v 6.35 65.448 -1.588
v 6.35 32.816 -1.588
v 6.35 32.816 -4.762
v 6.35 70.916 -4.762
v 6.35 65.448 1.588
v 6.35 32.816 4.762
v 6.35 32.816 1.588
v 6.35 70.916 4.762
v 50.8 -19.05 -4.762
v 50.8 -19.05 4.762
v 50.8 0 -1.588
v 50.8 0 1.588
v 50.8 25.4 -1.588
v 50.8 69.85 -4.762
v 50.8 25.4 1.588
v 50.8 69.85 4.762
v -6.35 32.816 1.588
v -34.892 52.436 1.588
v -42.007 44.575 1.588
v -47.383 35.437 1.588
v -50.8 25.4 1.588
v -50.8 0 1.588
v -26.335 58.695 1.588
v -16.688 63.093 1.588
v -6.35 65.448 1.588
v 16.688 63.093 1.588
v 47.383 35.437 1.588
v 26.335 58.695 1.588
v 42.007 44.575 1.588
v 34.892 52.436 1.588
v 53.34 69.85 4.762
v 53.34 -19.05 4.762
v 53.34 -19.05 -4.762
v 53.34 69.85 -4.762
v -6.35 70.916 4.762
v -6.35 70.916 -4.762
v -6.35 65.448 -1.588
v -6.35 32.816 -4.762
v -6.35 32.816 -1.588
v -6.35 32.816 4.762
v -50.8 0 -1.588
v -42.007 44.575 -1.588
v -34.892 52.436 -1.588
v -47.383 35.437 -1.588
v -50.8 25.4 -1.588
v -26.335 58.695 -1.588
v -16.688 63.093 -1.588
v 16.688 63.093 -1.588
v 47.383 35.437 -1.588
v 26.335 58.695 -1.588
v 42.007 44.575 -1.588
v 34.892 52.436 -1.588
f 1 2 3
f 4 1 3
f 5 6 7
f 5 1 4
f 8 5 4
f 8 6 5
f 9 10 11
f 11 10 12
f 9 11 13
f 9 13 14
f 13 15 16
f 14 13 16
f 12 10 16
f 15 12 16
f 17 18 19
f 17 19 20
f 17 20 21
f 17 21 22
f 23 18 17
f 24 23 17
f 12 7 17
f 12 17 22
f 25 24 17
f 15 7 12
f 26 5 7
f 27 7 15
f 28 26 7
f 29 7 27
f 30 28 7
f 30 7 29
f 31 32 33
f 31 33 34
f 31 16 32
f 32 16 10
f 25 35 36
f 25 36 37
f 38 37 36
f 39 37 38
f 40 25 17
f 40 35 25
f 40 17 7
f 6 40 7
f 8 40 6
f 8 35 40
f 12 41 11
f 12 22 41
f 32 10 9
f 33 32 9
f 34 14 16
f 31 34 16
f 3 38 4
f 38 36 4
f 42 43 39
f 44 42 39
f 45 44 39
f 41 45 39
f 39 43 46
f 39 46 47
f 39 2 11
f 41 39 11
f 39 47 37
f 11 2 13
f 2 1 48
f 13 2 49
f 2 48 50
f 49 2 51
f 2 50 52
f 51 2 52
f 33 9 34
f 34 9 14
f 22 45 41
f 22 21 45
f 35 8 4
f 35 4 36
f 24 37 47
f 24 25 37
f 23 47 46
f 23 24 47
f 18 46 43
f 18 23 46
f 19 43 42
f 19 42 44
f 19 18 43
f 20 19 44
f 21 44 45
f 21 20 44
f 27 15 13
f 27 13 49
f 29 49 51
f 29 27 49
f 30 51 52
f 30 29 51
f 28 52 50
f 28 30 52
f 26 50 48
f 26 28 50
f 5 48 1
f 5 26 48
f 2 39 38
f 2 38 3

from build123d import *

# Parameters (mm, degrees)
F1_DEPTH = 1.5875
F2_DEPTH = 1.5875
F3_DEPTH = 4.7625
F4_DEPTH = 4.7625
F5_W     = 19.05
F5_H     = 3.175
F5_W_2   = 25.4
F5_W_3   = 44.45
F6_DEPTH = 2.54


with BuildPart() as f1:
    # F0 (on Top) → F1 (new body)
    with BuildSketch(Plane.XY):
        with BuildLine():
            Line((-50.8, 0), (0, 0))
            Line((0, 0), (50.8, 0))
            Line((50.8, 0), (50.8, 25.4))
            ThreePointArc((50.8, 25.4), (34.8924839126, 52.4357961473), (6.35, 65.4477119742))
            Line((6.35, 65.4477119742), (6.35, 32.8159203153))
            Line((6.35, 32.8159203153), (0, 32.8159203153))
            Line((0, 32.8159203153), (-6.35, 32.8159203153))
            Line((-6.35, 32.8159203153), (-6.35, 65.4477119742))
            ThreePointArc((-6.35, 65.4477119742), (-34.8924839126, 52.4357961473), (-50.8, 25.4))
            Line((-50.8, 25.4), (-50.8, 0))
        make_face()
    extrude(amount=F1_DEPTH)

    # F2 (add): a face of the model
    f2_faces = [f1.faces().sort_by_distance(p)[0] for p in [
        (0, 27.1005445022, 0),
    ]]
    extrude(f2_faces, amount=F2_DEPTH)

    # F0 (on Top) → F3 (join)
    with BuildSketch(Plane.XY):
        with BuildLine():
            ThreePointArc((6.35, 65.4477119742), (0, 65.8359203153), (-6.35, 65.4477119742))
            Line((-6.35, 65.4477119742), (-6.35, 32.8159203153))
            Line((-6.35, 32.8159203153), (0, 32.8159203153))
            Line((0, 32.8159203153), (6.35, 32.8159203153))
            Line((6.35, 32.8159203153), (6.35, 65.4477119742))
        make_face()
        with BuildLine():
            Line((-6.35, 70.9159203153), (-6.35, 65.4477119742))
            ThreePointArc((-6.35, 65.4477119742), (0, 65.8359203153), (6.35, 65.4477119742))
            Line((6.35, 65.4477119742), (6.35, 70.9159203153))
            Line((6.35, 70.9159203153), (0, 70.9159203153))
            Line((0, 70.9159203153), (-6.35, 70.9159203153))
        make_face()
    extrude(amount=F3_DEPTH)

    # F0 (on Top) → F4 (join)
    with BuildSketch(Plane.XY):
        with BuildLine():
            ThreePointArc((6.35, 65.4477119742), (0, 65.8359203153), (-6.35, 65.4477119742))
            Line((-6.35, 65.4477119742), (-6.35, 32.8159203153))
            Line((-6.35, 32.8159203153), (0, 32.8159203153))
            Line((0, 32.8159203153), (6.35, 32.8159203153))
            Line((6.35, 32.8159203153), (6.35, 65.4477119742))
        make_face()
        with BuildLine():
            Line((-6.35, 70.9159203153), (-6.35, 65.4477119742))
            ThreePointArc((-6.35, 65.4477119742), (0, 65.8359203153), (6.35, 65.4477119742))
            Line((6.35, 65.4477119742), (6.35, 70.9159203153))
            Line((6.35, 70.9159203153), (0, 70.9159203153))
            Line((0, 70.9159203153), (-6.35, 70.9159203153))
        make_face()
    extrude(amount=-F4_DEPTH)

    # F5 (on face) → F6 (join)
    with BuildSketch(Plane.YZ.offset(50.8)):
        with Locations((-9.525, 0)):
            Rectangle(F5_W, F5_H)
        Polygon((-19.05, 1.5875), (0, 1.5875), (25.4, 1.5875), (69.85, 1.5875), (69.85, 4.7625), (-19.05, 4.7625), align=None)
        with Locations((12.7, 0)):
            Rectangle(F5_W_2, F5_H)
        with Locations((47.625, 0)):
            Rectangle(F5_W_3, F5_H)
        Polygon((25.4, -1.5875), (0, -1.5875), (-19.05, -1.5875), (-19.05, -4.7625), (69.85, -4.7625), (69.85, -1.5875), align=None)
    extrude(amount=F6_DEPTH)


solid = f1.part
